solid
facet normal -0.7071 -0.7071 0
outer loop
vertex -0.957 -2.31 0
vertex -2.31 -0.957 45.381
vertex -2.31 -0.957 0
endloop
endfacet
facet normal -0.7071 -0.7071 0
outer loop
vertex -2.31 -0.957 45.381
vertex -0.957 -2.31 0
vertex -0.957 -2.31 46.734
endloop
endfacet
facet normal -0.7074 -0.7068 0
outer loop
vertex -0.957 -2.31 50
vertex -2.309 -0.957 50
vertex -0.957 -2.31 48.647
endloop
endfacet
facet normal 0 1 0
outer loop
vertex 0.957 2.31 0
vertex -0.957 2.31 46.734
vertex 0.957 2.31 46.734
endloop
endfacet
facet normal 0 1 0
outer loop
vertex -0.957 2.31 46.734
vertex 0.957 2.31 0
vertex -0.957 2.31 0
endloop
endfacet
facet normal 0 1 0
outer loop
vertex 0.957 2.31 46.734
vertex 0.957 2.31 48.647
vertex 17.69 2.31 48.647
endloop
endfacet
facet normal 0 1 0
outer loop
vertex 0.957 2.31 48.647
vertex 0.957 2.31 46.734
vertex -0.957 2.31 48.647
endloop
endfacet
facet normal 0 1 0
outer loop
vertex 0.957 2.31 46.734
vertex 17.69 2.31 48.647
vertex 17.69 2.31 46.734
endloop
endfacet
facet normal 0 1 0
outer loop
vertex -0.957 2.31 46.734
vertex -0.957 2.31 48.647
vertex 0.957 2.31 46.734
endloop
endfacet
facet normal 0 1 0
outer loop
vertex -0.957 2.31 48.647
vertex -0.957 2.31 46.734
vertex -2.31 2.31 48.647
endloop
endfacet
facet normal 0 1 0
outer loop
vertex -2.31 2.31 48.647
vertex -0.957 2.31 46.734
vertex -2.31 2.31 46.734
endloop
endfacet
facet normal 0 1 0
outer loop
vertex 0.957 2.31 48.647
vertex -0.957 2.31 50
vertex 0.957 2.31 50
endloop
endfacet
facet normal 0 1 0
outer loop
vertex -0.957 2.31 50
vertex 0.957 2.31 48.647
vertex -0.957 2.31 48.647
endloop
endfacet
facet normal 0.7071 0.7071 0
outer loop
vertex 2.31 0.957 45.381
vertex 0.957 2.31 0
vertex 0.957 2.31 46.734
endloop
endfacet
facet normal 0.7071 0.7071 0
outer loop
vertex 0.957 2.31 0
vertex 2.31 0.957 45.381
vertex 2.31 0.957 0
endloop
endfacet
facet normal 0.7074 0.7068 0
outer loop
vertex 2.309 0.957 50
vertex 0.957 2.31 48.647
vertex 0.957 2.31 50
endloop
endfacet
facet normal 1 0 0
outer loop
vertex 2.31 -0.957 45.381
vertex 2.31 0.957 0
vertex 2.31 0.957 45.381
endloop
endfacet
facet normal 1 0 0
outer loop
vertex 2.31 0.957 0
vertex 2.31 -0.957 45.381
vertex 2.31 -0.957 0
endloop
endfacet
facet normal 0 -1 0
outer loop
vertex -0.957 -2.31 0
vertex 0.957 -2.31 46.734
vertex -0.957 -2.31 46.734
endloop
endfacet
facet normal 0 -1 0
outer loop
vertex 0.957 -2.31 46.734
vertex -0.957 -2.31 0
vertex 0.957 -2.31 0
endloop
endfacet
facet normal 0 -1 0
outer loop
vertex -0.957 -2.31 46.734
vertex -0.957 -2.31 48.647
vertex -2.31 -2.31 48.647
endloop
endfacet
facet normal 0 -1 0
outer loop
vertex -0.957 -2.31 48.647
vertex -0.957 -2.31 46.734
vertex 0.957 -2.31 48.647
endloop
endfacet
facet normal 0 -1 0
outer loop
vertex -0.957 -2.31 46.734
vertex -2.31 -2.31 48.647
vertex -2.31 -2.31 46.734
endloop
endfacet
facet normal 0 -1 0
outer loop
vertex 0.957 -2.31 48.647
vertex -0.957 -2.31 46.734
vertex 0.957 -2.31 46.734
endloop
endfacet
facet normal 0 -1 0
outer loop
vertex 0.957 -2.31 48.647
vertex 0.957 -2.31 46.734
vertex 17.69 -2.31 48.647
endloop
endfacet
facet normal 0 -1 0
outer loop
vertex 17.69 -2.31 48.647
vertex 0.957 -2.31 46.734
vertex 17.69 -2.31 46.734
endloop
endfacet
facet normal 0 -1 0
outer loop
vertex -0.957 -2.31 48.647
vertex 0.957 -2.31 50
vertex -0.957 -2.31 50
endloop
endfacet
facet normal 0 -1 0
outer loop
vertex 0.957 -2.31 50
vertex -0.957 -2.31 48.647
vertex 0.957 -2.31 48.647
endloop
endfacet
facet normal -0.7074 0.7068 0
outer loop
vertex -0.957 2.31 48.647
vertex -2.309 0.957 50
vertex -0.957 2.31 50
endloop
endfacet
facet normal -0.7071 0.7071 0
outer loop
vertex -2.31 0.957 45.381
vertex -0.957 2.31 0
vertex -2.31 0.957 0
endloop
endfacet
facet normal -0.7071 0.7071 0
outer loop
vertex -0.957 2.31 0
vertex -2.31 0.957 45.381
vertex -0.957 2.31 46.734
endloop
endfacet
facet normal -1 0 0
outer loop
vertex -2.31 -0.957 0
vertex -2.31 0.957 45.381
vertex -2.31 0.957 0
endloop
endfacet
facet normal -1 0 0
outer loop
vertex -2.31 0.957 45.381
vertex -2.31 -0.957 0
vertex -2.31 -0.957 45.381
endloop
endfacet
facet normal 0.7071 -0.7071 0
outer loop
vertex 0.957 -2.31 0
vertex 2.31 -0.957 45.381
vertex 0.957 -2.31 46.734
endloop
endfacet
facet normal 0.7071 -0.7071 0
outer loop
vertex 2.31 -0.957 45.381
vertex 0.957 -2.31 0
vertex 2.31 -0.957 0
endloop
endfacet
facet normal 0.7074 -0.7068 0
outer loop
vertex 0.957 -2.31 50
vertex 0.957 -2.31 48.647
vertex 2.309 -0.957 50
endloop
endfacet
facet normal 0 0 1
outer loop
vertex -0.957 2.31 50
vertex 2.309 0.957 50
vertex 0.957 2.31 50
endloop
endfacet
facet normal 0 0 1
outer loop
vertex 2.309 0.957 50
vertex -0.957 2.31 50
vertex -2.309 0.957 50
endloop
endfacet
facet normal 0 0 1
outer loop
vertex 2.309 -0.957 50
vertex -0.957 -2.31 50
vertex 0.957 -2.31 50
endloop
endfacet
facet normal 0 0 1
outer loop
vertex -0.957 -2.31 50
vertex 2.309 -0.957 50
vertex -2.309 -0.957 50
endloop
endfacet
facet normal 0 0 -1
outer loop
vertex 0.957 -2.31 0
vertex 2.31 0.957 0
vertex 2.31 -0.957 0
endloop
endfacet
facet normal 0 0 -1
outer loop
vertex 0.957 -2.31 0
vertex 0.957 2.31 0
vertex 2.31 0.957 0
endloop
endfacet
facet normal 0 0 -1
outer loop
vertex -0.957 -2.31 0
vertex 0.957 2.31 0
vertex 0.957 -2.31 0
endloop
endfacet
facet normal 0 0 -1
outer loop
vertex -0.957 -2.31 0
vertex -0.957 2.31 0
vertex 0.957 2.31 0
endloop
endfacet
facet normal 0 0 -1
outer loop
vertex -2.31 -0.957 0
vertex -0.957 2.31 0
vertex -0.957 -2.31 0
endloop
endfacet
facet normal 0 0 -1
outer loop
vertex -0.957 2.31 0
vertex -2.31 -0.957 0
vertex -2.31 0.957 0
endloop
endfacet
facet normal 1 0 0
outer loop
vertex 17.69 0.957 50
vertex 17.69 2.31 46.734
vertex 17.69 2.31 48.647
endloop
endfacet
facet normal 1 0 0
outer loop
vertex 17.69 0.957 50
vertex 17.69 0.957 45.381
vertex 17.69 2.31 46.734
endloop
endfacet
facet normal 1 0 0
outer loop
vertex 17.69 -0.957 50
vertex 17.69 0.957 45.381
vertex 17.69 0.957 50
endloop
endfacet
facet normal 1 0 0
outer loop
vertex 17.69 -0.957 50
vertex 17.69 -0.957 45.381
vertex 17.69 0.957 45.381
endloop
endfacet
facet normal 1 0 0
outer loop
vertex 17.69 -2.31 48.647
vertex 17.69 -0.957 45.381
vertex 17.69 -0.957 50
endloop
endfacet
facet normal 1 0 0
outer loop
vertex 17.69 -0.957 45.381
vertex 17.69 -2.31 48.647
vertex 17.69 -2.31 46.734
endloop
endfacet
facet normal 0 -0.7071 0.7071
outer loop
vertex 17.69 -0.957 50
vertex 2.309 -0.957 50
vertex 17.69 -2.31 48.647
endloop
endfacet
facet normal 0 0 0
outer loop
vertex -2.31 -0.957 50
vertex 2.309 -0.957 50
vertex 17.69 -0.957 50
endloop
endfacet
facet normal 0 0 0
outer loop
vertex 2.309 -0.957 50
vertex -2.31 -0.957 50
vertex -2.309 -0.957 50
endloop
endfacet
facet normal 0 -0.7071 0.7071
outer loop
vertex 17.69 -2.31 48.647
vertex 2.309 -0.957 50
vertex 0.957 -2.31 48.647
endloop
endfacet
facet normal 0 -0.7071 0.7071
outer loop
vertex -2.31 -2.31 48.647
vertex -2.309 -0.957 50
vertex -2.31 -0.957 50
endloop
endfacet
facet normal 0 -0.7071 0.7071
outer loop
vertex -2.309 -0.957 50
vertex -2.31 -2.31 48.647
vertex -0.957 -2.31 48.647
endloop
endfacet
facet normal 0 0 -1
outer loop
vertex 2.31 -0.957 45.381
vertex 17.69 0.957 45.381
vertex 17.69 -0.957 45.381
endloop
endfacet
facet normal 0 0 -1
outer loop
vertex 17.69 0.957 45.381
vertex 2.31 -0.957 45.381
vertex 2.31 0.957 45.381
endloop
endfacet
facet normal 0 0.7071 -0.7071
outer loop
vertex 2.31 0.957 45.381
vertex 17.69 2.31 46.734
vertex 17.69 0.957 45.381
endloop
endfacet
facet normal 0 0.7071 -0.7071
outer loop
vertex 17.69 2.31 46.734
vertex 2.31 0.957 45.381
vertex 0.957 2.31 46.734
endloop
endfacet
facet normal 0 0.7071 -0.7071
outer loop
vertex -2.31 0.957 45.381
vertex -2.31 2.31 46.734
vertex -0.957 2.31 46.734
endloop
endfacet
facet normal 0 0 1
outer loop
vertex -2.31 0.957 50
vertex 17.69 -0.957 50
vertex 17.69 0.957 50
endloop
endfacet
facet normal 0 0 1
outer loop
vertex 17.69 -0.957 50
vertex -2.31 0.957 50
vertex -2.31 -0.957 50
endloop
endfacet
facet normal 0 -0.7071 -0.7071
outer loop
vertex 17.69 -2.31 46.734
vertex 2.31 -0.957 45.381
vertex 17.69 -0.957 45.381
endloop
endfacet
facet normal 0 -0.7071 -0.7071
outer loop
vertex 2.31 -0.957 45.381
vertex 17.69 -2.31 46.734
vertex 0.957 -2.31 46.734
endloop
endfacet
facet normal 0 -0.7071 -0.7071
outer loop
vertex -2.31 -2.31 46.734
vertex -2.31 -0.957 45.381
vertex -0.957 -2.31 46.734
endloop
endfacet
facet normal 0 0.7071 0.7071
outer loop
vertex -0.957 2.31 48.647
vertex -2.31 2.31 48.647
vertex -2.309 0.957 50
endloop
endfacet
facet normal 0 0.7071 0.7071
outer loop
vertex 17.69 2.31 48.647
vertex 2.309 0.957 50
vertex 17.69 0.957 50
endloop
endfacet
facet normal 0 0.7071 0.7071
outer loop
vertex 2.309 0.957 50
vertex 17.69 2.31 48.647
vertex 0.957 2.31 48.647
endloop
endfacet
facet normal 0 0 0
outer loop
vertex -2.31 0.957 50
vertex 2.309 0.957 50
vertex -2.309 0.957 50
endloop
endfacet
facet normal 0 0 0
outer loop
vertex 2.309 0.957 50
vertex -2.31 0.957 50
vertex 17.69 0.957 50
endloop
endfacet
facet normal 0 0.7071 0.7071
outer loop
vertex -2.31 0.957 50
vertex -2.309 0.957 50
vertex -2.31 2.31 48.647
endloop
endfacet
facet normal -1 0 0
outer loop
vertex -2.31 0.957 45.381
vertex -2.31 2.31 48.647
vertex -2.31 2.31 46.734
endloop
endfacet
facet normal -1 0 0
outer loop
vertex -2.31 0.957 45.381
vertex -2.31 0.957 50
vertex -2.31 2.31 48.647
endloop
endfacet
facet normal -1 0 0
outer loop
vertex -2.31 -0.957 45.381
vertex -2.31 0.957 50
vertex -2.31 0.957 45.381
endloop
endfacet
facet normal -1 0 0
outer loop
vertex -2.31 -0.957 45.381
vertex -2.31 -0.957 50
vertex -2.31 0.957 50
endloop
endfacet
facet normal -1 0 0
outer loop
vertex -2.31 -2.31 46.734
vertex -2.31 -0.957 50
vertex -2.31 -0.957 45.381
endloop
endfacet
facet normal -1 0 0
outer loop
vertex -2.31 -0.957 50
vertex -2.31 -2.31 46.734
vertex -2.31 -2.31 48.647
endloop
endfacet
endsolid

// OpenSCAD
// Key diameter
diameter=5;

//Height
height=50;

//Lenth
lenth=20;

/* [Hidden] */

z=(-height)+diameter/2.165;

$fn=8;

x=diameter/-2.1645021645;

rotation=(360/$fn)/2;

radius=diameter/2;

rotate([0,0,rotation]){
cylinder(r=radius, h=height);
    }


rotate([0,90,0]){
    translate([z,0,x]){
        rotate([0,0,rotation]){
            cylinder(r=radius, h=lenth);
        }
    }
}
